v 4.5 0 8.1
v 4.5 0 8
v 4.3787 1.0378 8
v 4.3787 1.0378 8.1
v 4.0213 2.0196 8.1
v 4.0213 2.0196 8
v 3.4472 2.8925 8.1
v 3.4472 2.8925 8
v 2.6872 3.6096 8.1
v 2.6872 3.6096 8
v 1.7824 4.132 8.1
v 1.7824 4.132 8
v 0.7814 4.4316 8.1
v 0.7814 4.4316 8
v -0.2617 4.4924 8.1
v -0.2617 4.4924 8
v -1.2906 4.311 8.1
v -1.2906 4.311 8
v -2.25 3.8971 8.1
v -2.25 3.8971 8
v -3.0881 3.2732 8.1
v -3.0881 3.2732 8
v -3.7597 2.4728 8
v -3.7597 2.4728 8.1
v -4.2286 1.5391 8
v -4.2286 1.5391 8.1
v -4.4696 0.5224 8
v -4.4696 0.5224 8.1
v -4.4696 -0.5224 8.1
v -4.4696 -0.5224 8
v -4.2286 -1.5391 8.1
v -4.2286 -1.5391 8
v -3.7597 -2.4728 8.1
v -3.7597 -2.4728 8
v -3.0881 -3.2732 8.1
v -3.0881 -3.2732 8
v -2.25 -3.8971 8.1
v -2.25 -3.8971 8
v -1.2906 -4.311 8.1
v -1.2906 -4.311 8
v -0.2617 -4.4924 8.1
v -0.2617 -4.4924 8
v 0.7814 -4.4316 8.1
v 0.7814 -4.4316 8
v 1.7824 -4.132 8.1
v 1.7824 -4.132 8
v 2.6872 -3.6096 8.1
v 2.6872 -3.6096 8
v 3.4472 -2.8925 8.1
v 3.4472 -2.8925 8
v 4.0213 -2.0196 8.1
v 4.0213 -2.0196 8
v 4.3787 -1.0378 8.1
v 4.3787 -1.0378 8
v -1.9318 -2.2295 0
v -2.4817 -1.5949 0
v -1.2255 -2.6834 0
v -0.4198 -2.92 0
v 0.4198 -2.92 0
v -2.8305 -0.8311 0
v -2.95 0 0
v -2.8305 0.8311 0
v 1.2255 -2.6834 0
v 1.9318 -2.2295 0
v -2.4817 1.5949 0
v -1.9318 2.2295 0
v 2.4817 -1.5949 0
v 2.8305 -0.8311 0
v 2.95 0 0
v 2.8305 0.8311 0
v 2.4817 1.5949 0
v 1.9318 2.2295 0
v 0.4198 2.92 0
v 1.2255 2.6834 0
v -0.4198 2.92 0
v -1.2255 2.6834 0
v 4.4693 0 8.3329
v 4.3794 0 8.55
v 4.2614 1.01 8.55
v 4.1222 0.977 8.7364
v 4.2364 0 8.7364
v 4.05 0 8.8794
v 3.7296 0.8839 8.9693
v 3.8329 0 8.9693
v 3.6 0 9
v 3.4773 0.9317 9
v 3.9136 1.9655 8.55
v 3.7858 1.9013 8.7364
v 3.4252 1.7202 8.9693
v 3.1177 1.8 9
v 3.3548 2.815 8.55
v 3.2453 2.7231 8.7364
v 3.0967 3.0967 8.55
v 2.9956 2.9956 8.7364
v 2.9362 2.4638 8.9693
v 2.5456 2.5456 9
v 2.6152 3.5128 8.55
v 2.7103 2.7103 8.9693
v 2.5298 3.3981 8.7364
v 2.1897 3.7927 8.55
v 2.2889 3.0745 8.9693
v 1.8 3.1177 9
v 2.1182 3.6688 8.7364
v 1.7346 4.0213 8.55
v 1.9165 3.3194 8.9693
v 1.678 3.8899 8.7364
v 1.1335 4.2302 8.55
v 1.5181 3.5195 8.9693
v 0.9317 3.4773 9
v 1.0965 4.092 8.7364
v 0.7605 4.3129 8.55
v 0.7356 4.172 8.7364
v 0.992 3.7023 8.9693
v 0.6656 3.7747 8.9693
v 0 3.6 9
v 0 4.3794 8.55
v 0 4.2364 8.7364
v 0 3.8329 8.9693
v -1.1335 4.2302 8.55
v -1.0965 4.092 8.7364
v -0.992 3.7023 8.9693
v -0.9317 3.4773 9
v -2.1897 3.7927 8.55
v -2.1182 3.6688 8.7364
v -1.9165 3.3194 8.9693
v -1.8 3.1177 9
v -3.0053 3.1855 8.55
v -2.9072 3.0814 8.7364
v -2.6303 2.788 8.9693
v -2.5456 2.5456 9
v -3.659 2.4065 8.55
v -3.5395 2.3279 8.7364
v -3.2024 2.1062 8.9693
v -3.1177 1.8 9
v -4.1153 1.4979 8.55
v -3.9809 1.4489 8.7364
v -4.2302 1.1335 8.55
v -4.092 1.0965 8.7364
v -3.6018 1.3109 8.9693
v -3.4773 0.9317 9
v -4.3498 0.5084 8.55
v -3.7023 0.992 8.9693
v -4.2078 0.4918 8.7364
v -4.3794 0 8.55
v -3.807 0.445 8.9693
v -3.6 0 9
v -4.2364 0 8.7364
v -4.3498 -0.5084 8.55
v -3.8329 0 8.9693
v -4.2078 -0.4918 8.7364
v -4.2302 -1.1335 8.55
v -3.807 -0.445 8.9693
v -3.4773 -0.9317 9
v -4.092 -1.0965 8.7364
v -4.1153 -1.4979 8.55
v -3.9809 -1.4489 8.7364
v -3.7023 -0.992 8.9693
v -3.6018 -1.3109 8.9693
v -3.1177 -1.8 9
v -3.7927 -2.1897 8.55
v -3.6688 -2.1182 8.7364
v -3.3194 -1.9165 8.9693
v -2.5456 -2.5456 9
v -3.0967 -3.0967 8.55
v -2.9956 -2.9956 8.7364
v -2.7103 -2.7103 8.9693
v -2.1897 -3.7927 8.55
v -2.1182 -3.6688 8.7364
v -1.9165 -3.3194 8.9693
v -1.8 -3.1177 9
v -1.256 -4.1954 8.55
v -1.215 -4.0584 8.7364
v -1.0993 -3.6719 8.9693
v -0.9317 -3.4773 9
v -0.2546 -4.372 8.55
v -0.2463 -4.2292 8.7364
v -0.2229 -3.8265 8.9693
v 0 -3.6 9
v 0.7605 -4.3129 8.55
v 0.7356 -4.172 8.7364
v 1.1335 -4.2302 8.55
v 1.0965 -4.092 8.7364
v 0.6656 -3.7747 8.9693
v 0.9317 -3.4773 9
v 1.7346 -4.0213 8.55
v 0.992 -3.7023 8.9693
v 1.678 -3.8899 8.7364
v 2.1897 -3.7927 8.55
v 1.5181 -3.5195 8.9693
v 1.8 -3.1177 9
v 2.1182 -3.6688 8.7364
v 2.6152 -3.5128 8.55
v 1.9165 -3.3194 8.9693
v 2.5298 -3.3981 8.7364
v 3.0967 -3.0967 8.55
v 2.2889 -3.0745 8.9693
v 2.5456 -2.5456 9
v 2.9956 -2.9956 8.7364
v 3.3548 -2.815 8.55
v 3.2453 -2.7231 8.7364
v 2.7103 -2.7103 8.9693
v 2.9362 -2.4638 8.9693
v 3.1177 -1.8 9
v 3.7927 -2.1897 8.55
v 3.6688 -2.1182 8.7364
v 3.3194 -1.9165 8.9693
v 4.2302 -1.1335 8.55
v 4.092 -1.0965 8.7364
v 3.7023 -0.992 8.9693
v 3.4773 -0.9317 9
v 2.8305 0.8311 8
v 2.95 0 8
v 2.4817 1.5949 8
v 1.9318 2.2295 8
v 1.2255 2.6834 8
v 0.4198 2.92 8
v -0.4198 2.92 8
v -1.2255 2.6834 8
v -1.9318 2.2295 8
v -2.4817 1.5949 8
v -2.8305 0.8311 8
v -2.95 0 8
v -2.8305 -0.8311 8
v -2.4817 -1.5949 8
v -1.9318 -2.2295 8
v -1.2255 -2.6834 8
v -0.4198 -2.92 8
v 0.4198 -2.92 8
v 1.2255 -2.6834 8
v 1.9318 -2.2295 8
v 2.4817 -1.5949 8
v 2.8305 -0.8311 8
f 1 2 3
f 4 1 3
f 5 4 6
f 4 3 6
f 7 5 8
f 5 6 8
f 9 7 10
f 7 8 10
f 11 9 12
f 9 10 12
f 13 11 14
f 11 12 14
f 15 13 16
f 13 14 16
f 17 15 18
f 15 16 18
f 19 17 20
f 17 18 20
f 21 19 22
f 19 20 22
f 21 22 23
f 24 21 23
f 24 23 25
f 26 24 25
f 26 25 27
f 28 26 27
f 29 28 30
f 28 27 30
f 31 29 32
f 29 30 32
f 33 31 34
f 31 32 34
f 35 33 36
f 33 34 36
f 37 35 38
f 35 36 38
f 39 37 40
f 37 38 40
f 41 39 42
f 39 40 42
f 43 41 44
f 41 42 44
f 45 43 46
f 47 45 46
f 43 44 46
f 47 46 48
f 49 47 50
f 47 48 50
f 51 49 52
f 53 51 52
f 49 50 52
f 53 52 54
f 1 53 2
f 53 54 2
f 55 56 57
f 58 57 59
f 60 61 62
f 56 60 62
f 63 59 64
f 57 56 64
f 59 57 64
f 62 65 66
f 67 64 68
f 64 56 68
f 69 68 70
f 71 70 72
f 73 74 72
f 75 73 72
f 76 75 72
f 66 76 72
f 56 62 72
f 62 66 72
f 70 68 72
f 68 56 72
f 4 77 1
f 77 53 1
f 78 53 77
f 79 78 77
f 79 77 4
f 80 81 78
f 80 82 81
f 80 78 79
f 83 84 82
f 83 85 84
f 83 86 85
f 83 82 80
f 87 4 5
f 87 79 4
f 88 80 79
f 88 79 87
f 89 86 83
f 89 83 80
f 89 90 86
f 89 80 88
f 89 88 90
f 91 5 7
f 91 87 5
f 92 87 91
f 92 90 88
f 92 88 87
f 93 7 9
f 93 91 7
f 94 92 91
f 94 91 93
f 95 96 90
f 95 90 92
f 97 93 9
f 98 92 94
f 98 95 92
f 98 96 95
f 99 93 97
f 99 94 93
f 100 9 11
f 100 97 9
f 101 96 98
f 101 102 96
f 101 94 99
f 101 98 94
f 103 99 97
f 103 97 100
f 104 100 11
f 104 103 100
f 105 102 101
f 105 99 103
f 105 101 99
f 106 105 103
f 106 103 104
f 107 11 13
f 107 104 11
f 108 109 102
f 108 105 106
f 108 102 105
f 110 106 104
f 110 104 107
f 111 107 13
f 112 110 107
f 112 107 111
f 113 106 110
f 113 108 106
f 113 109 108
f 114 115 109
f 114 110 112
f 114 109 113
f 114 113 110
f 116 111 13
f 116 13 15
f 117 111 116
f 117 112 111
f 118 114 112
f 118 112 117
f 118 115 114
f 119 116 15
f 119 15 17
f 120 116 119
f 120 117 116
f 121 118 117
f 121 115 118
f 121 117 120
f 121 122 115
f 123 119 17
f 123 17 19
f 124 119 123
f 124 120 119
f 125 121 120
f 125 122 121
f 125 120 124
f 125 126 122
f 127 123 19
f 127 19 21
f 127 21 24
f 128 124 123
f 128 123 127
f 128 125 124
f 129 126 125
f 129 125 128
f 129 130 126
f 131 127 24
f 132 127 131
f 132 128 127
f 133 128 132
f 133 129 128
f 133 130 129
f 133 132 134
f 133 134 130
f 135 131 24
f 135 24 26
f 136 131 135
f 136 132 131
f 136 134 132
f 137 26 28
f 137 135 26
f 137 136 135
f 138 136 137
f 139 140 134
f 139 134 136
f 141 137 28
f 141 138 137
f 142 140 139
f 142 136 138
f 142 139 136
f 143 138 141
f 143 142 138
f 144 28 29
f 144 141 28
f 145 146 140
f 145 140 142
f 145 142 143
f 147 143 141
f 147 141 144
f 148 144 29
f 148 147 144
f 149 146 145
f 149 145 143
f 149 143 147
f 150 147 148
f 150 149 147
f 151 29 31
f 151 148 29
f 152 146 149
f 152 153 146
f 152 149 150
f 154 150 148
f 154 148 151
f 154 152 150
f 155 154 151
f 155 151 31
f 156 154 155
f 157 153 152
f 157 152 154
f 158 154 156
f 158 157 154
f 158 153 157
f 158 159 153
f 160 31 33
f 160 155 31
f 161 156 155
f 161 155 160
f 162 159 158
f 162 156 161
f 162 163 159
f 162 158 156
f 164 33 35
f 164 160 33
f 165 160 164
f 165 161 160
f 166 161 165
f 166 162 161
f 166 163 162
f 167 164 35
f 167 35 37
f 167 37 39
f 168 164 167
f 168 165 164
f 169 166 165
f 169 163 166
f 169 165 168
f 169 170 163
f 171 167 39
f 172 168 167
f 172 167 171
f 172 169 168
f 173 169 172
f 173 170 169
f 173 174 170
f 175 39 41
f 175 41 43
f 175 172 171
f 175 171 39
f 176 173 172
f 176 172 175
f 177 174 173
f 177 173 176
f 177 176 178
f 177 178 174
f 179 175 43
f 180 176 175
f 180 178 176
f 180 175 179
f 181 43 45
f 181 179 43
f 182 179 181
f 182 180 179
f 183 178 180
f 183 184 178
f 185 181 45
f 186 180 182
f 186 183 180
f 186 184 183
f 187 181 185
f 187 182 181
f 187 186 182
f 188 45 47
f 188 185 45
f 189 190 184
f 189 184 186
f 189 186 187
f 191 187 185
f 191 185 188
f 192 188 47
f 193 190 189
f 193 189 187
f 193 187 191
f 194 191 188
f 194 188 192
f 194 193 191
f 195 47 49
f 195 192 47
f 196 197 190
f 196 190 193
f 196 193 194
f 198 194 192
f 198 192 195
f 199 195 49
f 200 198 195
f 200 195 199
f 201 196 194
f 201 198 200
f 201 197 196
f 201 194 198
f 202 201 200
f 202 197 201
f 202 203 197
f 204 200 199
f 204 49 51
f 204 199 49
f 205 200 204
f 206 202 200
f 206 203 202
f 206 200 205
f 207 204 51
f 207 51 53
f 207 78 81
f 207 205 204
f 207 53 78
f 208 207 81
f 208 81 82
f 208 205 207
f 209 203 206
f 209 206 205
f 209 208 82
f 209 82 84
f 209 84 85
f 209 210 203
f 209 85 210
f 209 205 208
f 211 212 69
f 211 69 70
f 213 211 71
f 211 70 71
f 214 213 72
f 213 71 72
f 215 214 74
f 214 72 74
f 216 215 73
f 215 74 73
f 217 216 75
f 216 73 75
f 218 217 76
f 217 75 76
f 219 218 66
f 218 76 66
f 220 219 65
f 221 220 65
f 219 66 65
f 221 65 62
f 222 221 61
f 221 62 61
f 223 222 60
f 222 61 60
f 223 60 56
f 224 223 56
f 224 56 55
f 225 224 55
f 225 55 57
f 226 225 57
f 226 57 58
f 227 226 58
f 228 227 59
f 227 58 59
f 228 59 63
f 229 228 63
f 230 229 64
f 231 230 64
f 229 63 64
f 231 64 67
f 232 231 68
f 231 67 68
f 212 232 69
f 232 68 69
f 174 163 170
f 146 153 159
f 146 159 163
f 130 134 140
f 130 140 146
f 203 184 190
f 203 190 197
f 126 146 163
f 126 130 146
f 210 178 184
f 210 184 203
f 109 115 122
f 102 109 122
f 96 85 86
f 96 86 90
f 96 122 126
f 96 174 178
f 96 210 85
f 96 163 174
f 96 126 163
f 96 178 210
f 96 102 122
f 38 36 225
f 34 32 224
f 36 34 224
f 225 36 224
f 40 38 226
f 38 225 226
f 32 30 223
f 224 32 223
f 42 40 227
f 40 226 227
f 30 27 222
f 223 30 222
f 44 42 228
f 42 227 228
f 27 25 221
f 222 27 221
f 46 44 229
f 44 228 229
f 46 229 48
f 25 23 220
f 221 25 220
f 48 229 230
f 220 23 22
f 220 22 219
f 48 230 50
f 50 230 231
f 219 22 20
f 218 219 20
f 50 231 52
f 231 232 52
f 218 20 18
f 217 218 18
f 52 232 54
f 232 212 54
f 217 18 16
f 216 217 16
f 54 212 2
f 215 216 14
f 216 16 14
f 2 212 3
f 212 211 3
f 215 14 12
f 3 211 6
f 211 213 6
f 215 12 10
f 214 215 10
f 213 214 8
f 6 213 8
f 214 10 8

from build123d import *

# Parameters (mm, degrees)
CYLINDER003_R     = 4.5
CYLINDER003_DEPTH = 1
FILLET001_R       = 0.9
CYLINDER002_R     = 2.95
CYLINDER002_DEPTH = 8


with BuildPart() as fillet001:
    # Cylinder003 → Cylinder003 (new body)
    with BuildSketch(Plane.XY.offset(8)):
        Circle(CYLINDER003_R)
    extrude(amount=CYLINDER003_DEPTH)

    # Fillet001
    fillet001_edges = [fillet001.edges().sort_by_distance(p)[0] for p in [
        (-4.5, 0, 9),
    ]]
    fillet(fillet001_edges, radius=FILLET001_R)


with BuildPart() as fusion001:
    # Cylinder002 → Cylinder002 (new body)
    with BuildSketch(Plane.XY):
        Circle(CYLINDER002_R)
    extrude(amount=CYLINDER002_DEPTH)

    # Fusion001: union Fillet001
    add(fillet001.part)


solid = fusion001.part
